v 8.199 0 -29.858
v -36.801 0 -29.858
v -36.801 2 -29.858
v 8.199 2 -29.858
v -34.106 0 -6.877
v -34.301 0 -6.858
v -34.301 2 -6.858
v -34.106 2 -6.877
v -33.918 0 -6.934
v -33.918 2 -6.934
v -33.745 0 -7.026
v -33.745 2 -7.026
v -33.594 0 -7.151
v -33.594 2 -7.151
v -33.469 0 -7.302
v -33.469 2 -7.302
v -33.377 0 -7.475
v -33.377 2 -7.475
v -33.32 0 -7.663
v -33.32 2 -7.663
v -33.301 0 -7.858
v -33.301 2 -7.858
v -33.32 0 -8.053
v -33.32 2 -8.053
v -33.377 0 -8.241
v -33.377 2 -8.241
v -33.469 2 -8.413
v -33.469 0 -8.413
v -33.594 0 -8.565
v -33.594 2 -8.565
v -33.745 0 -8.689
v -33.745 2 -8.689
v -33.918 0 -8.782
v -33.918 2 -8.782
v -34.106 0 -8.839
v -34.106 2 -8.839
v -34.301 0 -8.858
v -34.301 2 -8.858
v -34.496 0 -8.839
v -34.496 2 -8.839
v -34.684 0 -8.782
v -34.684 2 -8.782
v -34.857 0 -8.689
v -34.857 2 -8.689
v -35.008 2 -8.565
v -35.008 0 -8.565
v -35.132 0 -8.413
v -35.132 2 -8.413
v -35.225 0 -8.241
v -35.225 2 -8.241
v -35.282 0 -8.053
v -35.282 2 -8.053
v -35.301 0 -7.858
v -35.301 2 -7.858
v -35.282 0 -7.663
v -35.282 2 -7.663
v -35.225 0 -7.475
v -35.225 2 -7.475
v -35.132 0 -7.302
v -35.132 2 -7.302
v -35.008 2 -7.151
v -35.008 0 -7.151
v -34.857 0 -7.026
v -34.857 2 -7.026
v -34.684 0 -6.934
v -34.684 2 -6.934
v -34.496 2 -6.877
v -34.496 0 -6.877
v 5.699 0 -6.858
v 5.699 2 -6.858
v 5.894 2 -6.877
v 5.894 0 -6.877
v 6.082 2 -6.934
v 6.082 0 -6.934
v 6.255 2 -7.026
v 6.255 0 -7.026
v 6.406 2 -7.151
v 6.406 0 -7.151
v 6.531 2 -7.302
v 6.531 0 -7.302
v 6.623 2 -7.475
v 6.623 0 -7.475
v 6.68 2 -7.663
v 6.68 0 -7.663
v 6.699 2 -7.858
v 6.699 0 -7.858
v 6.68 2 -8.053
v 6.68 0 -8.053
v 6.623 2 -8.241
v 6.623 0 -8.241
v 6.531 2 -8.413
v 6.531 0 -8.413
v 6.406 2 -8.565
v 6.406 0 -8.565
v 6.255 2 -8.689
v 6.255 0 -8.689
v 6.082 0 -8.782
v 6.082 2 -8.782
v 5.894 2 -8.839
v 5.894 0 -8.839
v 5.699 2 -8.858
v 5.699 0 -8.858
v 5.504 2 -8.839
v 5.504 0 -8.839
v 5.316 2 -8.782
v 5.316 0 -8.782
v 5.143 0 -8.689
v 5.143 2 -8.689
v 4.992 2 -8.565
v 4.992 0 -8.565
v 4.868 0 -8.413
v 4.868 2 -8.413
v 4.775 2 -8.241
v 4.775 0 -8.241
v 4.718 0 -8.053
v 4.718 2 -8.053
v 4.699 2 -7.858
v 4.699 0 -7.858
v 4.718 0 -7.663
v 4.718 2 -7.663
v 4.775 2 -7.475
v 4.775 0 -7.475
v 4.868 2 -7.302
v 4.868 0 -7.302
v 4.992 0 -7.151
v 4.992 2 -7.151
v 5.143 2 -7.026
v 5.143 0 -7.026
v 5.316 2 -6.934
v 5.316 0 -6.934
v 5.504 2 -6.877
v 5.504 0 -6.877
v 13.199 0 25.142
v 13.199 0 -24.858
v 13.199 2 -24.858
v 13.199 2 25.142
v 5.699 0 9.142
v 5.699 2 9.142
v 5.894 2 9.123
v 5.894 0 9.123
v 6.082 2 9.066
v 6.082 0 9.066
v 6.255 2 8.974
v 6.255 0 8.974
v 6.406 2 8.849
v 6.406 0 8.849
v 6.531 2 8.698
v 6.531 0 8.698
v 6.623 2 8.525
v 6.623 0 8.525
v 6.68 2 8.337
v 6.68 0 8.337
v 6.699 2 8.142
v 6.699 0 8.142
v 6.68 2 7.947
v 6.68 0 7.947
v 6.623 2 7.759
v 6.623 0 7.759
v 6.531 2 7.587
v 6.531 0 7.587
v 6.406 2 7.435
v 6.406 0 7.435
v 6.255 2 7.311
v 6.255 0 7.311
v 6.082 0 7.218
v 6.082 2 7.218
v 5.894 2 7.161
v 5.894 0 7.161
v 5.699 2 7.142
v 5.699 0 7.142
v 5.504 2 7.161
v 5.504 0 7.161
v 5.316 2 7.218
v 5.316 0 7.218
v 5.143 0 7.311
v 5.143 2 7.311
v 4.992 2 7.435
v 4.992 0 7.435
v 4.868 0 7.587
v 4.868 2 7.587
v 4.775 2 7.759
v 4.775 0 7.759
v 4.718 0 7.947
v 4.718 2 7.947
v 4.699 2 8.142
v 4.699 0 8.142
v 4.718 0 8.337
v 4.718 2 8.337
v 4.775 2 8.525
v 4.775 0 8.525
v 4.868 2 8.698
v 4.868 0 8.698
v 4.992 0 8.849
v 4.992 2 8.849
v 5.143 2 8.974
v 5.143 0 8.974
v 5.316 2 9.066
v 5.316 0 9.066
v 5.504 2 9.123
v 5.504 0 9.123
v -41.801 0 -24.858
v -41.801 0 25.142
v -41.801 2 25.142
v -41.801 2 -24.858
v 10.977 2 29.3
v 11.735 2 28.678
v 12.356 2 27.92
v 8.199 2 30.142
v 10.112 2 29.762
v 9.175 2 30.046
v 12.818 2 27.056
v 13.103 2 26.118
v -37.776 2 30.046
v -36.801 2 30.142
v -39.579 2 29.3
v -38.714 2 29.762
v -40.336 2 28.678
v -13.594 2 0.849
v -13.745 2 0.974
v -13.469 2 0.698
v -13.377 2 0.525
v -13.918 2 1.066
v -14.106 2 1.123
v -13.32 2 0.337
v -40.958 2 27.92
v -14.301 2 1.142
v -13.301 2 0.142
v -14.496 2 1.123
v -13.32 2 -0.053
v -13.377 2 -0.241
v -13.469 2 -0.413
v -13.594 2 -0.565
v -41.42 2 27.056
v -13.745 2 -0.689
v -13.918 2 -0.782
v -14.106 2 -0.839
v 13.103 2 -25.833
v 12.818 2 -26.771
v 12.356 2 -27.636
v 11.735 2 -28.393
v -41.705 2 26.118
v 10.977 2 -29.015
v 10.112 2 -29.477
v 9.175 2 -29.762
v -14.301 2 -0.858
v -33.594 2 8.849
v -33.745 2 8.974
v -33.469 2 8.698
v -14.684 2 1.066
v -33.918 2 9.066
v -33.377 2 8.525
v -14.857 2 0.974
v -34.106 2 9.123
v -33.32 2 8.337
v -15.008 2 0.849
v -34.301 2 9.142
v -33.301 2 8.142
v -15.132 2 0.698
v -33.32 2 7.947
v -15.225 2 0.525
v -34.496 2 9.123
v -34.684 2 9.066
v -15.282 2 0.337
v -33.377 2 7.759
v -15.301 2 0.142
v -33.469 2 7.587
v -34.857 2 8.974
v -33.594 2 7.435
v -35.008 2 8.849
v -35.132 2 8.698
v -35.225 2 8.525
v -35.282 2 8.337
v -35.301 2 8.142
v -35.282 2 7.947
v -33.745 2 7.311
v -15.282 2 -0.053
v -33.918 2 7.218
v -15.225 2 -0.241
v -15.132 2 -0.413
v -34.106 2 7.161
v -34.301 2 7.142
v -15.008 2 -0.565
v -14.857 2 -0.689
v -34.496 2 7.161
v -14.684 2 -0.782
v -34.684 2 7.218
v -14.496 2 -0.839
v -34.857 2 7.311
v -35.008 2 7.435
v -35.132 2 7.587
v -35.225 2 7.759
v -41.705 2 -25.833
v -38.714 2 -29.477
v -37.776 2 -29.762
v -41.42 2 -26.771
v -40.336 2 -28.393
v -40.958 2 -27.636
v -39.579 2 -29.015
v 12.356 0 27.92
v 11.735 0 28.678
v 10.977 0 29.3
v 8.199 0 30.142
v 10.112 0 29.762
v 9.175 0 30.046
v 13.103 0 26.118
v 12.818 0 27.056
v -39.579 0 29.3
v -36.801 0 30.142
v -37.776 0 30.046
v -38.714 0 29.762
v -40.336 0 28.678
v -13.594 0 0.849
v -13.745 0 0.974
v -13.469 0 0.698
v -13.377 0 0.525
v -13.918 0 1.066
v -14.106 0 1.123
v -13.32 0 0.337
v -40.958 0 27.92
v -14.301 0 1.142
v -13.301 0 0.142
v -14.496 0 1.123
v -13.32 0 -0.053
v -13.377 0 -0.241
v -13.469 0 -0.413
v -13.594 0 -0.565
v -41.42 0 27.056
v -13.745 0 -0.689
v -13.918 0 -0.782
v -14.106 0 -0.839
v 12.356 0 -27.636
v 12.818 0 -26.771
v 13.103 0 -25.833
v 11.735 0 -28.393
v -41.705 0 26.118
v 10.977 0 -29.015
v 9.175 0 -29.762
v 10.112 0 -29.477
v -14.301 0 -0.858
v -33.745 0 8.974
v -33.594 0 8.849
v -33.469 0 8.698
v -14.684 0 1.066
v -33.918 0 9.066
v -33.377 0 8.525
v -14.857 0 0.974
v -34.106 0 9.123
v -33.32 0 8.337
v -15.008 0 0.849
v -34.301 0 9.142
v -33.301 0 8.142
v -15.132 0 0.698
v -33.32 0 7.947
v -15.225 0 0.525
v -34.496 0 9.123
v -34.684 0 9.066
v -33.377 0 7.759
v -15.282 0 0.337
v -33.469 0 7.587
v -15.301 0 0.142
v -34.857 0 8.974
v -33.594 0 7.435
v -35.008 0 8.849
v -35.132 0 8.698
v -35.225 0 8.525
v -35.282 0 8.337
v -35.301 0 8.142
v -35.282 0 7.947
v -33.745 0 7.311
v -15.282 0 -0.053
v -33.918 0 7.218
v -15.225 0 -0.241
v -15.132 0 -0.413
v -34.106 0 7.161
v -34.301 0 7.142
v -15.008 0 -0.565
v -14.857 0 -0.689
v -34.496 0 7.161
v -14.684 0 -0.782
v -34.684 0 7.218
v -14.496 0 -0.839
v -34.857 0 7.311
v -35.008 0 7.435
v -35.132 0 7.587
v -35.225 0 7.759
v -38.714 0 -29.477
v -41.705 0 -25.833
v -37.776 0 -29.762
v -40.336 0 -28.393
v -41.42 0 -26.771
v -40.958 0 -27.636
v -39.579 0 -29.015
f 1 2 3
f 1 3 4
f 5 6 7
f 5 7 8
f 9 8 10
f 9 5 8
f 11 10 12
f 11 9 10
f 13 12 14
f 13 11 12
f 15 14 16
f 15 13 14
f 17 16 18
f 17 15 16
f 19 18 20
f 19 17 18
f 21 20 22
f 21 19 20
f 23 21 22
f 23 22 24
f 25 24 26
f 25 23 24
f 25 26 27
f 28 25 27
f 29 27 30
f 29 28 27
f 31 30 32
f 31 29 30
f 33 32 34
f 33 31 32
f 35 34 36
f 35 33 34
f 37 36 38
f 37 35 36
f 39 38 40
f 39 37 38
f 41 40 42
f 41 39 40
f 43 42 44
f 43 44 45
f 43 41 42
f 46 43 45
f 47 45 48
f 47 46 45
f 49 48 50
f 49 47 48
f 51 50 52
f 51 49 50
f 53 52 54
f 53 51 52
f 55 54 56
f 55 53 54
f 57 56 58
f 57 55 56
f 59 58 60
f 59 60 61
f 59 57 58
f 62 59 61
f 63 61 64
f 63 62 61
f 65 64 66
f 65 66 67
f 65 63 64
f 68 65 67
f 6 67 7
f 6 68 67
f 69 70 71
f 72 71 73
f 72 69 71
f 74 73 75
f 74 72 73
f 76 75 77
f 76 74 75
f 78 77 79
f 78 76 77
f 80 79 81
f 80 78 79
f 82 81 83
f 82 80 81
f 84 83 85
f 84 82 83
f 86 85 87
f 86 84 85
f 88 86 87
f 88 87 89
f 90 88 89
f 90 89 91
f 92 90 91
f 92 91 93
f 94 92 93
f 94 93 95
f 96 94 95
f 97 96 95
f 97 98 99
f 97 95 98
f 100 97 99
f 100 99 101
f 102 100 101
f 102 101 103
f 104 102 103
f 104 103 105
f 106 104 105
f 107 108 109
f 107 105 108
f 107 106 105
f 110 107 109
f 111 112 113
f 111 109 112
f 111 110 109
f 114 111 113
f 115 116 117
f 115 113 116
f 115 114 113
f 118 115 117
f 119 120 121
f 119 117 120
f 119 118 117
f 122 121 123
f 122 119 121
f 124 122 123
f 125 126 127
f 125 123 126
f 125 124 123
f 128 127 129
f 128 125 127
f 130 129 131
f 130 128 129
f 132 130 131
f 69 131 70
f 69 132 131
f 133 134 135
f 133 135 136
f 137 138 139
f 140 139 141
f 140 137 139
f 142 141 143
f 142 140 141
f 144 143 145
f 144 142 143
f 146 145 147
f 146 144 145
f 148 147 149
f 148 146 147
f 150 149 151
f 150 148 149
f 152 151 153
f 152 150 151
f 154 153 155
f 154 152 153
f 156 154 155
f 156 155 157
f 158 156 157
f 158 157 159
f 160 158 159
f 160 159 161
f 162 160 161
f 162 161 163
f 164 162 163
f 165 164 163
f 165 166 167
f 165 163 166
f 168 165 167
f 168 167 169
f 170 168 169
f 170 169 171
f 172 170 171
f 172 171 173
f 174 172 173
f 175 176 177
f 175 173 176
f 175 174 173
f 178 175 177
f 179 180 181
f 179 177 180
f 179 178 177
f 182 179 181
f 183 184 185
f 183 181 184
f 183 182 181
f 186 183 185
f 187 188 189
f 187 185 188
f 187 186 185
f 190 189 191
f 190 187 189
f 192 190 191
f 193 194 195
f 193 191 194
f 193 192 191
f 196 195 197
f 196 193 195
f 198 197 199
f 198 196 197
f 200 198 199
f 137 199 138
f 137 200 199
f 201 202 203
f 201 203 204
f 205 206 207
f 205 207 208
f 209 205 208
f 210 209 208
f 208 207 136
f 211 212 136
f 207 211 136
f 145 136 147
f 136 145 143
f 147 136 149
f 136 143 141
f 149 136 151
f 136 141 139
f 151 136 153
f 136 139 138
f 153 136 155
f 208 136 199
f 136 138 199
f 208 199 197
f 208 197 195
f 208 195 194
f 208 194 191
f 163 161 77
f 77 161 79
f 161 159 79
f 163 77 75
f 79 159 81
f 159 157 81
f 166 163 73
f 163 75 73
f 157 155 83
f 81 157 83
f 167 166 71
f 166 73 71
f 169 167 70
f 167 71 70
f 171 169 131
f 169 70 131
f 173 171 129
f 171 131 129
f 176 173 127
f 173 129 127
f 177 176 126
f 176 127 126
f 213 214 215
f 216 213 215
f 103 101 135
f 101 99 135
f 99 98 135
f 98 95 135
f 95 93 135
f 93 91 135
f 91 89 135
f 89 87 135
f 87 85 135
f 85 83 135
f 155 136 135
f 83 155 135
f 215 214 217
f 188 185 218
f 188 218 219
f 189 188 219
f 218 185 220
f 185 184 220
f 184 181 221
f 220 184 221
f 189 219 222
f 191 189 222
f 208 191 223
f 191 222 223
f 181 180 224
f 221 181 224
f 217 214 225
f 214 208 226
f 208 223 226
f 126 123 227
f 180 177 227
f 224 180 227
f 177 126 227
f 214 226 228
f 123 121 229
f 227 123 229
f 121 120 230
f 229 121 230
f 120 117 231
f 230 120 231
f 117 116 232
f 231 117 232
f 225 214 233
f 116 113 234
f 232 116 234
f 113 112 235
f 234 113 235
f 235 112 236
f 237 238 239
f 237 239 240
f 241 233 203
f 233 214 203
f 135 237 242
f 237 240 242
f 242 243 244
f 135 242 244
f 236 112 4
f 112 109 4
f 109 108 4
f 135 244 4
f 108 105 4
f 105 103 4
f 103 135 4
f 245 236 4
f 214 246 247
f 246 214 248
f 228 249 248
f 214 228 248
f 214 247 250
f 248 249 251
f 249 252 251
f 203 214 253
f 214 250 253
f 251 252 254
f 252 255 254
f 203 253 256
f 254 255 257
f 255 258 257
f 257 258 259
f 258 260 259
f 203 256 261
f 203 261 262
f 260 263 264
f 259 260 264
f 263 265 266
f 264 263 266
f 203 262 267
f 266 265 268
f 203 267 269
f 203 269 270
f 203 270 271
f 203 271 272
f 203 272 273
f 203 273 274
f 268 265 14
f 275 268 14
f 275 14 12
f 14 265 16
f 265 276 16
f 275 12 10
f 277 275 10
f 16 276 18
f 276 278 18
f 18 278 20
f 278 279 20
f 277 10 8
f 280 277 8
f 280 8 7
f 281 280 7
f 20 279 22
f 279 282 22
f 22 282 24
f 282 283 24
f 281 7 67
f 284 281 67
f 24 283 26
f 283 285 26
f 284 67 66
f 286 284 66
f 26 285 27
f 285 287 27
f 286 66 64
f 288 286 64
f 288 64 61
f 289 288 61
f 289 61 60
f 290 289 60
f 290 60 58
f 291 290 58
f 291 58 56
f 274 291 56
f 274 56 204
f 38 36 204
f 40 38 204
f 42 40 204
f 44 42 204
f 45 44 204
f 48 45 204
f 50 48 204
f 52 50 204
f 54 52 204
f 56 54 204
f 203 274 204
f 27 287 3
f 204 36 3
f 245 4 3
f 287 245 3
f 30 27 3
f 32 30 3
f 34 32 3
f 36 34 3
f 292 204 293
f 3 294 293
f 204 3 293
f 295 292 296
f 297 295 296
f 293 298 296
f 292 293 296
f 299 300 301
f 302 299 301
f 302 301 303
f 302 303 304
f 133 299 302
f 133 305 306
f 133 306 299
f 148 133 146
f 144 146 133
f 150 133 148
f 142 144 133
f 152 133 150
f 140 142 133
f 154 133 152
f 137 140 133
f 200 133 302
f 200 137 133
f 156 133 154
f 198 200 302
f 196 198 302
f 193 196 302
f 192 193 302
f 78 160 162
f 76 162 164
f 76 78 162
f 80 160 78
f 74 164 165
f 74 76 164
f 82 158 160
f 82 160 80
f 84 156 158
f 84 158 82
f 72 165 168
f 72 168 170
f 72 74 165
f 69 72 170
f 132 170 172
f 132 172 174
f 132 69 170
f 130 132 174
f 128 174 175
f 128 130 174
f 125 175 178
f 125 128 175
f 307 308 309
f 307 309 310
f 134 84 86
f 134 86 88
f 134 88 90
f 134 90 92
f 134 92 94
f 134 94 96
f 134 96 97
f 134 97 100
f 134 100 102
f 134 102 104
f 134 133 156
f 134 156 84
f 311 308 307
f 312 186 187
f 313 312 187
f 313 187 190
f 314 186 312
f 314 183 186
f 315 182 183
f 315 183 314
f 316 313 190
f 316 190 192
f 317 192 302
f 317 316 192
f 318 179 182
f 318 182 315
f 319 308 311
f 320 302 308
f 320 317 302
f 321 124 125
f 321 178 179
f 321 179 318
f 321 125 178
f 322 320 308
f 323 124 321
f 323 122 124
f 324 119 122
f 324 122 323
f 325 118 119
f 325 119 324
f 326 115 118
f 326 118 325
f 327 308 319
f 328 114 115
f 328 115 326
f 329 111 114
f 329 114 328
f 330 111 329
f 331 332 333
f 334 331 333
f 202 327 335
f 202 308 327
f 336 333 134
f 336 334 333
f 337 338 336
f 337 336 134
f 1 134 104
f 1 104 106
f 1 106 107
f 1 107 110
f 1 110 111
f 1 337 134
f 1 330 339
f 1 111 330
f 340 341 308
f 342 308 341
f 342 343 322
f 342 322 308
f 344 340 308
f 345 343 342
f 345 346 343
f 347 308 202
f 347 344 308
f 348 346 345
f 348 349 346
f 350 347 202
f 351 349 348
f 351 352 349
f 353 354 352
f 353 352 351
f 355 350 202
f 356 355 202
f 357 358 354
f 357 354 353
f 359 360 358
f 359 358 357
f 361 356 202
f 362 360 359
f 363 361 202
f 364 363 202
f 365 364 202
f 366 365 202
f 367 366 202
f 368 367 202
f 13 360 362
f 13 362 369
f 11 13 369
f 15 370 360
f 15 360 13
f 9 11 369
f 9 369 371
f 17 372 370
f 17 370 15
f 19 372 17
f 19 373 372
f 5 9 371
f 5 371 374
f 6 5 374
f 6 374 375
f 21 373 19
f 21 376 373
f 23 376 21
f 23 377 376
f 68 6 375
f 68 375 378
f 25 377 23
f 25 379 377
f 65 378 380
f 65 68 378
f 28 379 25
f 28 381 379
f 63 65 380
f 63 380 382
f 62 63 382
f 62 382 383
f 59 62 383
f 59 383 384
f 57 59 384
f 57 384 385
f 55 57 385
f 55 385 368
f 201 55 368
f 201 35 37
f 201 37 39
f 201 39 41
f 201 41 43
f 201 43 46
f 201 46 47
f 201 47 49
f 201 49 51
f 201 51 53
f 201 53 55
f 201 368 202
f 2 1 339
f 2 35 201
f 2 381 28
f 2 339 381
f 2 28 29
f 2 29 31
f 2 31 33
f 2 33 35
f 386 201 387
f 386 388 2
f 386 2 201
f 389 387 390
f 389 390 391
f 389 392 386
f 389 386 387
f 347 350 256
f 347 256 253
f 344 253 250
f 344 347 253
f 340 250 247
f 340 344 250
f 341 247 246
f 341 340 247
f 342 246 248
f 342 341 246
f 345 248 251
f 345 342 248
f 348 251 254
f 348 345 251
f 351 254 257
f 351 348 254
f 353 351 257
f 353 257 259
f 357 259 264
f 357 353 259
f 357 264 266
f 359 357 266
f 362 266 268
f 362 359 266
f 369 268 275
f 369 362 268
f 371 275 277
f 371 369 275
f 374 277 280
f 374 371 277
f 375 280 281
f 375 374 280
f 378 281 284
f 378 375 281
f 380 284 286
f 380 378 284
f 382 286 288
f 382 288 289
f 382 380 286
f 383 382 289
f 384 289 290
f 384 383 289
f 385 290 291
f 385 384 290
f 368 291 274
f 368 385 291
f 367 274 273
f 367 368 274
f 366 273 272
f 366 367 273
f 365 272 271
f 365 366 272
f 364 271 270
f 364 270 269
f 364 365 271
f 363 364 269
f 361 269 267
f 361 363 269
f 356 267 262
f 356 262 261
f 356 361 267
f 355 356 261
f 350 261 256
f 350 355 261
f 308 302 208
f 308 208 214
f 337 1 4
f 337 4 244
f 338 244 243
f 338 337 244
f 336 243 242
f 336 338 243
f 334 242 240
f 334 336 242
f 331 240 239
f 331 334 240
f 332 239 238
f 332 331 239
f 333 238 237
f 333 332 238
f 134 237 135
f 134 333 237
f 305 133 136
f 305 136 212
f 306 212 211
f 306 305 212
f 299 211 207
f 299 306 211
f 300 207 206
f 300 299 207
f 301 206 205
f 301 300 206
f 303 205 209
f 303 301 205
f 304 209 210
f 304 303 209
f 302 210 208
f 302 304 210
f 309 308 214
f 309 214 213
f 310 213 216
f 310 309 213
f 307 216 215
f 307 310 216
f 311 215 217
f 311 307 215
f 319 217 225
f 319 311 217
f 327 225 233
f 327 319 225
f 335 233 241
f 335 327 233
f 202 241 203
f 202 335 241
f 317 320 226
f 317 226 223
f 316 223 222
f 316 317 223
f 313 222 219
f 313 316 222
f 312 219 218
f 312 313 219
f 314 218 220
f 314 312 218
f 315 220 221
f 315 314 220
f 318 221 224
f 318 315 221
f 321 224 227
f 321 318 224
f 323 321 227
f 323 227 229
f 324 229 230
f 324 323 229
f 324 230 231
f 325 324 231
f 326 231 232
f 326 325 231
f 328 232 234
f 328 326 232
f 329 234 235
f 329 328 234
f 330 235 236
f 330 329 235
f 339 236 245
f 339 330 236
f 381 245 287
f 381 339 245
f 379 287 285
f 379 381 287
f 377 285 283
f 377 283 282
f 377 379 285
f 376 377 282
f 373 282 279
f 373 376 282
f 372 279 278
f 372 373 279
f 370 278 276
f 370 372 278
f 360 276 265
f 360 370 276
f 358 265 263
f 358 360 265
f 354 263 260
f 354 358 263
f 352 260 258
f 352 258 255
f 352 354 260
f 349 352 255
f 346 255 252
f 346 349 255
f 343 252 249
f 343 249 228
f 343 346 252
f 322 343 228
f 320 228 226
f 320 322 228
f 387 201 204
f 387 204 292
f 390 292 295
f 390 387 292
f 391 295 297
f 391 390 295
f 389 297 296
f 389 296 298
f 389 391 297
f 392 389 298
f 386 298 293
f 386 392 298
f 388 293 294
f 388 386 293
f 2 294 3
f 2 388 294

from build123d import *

# Parameters (mm, degrees)
SKETCH1_R           = 1
BOSS_EXTRUDE1_DEPTH = 2
SKETCH2_R           = 1
CUT_EXTRUDE1_DEPTH  = 9


with BuildPart() as part:
    # Sketch1 → Boss-Extrude1 (new body)
    with BuildSketch(Plane(origin=(0, 0, 0), x_dir=(1, 0, 0), z_dir=(0, 1, 0))):
        with BuildLine():
            Line((-36.800947867, 29.857819905), (8.199052133, 29.857819905))
            ThreePointArc((8.199052133, 29.857819905), (11.734586039, 28.393353811), (13.199052133, 24.857819905))
            Line((13.199052133, 24.857819905), (13.199052133, -25.142180095))
            ThreePointArc((13.199052133, -25.142180095), (11.734586039, -28.677714001), (8.199052133, -30.142180095))
            Line((8.199052133, -30.142180095), (-36.800947867, -30.142180095))
            ThreePointArc((-36.800947867, -30.142180095), (-40.336481773, -28.677714001), (-41.800947867, -25.142180095))
            Line((-41.800947867, -25.142180095), (-41.800947867, 24.857819905))
            ThreePointArc((-41.800947867, 24.857819905), (-40.336481773, 28.393353811), (-36.800947867, 29.857819905))
        make_face()
        with Locations(Location((-34.300947867, 7.857819905, 0), (0, 0, 270))):
            Circle(SKETCH1_R, mode=Mode.SUBTRACT)
        with Locations(Location((-34.300947867, -8.142180095, 0), (0, 0, 270))):
            Circle(SKETCH1_R, mode=Mode.SUBTRACT)
        with Locations(Location((-14.300947867, -0.142180095, 0), (0, 0, 270))):
            Circle(SKETCH1_R, mode=Mode.SUBTRACT)
    extrude(amount=BOSS_EXTRUDE1_DEPTH)

    # Sketch2 → Cut-Extrude1 (cut)
    with BuildSketch(Plane(origin=(0, 0, 0), x_dir=(1, 0, 0), z_dir=(0, 1, 0))):
        with Locations(Location((5.699052133, 7.857819905, 0), (0, 0, 270))):
            Circle(SKETCH2_R)
        with Locations(Location((5.699052133, -8.142180095, 0), (0, 0, 270))):
            Circle(SKETCH2_R)
    extrude(amount=CUT_EXTRUDE1_DEPTH, mode=Mode.SUBTRACT)


solid = part.part
